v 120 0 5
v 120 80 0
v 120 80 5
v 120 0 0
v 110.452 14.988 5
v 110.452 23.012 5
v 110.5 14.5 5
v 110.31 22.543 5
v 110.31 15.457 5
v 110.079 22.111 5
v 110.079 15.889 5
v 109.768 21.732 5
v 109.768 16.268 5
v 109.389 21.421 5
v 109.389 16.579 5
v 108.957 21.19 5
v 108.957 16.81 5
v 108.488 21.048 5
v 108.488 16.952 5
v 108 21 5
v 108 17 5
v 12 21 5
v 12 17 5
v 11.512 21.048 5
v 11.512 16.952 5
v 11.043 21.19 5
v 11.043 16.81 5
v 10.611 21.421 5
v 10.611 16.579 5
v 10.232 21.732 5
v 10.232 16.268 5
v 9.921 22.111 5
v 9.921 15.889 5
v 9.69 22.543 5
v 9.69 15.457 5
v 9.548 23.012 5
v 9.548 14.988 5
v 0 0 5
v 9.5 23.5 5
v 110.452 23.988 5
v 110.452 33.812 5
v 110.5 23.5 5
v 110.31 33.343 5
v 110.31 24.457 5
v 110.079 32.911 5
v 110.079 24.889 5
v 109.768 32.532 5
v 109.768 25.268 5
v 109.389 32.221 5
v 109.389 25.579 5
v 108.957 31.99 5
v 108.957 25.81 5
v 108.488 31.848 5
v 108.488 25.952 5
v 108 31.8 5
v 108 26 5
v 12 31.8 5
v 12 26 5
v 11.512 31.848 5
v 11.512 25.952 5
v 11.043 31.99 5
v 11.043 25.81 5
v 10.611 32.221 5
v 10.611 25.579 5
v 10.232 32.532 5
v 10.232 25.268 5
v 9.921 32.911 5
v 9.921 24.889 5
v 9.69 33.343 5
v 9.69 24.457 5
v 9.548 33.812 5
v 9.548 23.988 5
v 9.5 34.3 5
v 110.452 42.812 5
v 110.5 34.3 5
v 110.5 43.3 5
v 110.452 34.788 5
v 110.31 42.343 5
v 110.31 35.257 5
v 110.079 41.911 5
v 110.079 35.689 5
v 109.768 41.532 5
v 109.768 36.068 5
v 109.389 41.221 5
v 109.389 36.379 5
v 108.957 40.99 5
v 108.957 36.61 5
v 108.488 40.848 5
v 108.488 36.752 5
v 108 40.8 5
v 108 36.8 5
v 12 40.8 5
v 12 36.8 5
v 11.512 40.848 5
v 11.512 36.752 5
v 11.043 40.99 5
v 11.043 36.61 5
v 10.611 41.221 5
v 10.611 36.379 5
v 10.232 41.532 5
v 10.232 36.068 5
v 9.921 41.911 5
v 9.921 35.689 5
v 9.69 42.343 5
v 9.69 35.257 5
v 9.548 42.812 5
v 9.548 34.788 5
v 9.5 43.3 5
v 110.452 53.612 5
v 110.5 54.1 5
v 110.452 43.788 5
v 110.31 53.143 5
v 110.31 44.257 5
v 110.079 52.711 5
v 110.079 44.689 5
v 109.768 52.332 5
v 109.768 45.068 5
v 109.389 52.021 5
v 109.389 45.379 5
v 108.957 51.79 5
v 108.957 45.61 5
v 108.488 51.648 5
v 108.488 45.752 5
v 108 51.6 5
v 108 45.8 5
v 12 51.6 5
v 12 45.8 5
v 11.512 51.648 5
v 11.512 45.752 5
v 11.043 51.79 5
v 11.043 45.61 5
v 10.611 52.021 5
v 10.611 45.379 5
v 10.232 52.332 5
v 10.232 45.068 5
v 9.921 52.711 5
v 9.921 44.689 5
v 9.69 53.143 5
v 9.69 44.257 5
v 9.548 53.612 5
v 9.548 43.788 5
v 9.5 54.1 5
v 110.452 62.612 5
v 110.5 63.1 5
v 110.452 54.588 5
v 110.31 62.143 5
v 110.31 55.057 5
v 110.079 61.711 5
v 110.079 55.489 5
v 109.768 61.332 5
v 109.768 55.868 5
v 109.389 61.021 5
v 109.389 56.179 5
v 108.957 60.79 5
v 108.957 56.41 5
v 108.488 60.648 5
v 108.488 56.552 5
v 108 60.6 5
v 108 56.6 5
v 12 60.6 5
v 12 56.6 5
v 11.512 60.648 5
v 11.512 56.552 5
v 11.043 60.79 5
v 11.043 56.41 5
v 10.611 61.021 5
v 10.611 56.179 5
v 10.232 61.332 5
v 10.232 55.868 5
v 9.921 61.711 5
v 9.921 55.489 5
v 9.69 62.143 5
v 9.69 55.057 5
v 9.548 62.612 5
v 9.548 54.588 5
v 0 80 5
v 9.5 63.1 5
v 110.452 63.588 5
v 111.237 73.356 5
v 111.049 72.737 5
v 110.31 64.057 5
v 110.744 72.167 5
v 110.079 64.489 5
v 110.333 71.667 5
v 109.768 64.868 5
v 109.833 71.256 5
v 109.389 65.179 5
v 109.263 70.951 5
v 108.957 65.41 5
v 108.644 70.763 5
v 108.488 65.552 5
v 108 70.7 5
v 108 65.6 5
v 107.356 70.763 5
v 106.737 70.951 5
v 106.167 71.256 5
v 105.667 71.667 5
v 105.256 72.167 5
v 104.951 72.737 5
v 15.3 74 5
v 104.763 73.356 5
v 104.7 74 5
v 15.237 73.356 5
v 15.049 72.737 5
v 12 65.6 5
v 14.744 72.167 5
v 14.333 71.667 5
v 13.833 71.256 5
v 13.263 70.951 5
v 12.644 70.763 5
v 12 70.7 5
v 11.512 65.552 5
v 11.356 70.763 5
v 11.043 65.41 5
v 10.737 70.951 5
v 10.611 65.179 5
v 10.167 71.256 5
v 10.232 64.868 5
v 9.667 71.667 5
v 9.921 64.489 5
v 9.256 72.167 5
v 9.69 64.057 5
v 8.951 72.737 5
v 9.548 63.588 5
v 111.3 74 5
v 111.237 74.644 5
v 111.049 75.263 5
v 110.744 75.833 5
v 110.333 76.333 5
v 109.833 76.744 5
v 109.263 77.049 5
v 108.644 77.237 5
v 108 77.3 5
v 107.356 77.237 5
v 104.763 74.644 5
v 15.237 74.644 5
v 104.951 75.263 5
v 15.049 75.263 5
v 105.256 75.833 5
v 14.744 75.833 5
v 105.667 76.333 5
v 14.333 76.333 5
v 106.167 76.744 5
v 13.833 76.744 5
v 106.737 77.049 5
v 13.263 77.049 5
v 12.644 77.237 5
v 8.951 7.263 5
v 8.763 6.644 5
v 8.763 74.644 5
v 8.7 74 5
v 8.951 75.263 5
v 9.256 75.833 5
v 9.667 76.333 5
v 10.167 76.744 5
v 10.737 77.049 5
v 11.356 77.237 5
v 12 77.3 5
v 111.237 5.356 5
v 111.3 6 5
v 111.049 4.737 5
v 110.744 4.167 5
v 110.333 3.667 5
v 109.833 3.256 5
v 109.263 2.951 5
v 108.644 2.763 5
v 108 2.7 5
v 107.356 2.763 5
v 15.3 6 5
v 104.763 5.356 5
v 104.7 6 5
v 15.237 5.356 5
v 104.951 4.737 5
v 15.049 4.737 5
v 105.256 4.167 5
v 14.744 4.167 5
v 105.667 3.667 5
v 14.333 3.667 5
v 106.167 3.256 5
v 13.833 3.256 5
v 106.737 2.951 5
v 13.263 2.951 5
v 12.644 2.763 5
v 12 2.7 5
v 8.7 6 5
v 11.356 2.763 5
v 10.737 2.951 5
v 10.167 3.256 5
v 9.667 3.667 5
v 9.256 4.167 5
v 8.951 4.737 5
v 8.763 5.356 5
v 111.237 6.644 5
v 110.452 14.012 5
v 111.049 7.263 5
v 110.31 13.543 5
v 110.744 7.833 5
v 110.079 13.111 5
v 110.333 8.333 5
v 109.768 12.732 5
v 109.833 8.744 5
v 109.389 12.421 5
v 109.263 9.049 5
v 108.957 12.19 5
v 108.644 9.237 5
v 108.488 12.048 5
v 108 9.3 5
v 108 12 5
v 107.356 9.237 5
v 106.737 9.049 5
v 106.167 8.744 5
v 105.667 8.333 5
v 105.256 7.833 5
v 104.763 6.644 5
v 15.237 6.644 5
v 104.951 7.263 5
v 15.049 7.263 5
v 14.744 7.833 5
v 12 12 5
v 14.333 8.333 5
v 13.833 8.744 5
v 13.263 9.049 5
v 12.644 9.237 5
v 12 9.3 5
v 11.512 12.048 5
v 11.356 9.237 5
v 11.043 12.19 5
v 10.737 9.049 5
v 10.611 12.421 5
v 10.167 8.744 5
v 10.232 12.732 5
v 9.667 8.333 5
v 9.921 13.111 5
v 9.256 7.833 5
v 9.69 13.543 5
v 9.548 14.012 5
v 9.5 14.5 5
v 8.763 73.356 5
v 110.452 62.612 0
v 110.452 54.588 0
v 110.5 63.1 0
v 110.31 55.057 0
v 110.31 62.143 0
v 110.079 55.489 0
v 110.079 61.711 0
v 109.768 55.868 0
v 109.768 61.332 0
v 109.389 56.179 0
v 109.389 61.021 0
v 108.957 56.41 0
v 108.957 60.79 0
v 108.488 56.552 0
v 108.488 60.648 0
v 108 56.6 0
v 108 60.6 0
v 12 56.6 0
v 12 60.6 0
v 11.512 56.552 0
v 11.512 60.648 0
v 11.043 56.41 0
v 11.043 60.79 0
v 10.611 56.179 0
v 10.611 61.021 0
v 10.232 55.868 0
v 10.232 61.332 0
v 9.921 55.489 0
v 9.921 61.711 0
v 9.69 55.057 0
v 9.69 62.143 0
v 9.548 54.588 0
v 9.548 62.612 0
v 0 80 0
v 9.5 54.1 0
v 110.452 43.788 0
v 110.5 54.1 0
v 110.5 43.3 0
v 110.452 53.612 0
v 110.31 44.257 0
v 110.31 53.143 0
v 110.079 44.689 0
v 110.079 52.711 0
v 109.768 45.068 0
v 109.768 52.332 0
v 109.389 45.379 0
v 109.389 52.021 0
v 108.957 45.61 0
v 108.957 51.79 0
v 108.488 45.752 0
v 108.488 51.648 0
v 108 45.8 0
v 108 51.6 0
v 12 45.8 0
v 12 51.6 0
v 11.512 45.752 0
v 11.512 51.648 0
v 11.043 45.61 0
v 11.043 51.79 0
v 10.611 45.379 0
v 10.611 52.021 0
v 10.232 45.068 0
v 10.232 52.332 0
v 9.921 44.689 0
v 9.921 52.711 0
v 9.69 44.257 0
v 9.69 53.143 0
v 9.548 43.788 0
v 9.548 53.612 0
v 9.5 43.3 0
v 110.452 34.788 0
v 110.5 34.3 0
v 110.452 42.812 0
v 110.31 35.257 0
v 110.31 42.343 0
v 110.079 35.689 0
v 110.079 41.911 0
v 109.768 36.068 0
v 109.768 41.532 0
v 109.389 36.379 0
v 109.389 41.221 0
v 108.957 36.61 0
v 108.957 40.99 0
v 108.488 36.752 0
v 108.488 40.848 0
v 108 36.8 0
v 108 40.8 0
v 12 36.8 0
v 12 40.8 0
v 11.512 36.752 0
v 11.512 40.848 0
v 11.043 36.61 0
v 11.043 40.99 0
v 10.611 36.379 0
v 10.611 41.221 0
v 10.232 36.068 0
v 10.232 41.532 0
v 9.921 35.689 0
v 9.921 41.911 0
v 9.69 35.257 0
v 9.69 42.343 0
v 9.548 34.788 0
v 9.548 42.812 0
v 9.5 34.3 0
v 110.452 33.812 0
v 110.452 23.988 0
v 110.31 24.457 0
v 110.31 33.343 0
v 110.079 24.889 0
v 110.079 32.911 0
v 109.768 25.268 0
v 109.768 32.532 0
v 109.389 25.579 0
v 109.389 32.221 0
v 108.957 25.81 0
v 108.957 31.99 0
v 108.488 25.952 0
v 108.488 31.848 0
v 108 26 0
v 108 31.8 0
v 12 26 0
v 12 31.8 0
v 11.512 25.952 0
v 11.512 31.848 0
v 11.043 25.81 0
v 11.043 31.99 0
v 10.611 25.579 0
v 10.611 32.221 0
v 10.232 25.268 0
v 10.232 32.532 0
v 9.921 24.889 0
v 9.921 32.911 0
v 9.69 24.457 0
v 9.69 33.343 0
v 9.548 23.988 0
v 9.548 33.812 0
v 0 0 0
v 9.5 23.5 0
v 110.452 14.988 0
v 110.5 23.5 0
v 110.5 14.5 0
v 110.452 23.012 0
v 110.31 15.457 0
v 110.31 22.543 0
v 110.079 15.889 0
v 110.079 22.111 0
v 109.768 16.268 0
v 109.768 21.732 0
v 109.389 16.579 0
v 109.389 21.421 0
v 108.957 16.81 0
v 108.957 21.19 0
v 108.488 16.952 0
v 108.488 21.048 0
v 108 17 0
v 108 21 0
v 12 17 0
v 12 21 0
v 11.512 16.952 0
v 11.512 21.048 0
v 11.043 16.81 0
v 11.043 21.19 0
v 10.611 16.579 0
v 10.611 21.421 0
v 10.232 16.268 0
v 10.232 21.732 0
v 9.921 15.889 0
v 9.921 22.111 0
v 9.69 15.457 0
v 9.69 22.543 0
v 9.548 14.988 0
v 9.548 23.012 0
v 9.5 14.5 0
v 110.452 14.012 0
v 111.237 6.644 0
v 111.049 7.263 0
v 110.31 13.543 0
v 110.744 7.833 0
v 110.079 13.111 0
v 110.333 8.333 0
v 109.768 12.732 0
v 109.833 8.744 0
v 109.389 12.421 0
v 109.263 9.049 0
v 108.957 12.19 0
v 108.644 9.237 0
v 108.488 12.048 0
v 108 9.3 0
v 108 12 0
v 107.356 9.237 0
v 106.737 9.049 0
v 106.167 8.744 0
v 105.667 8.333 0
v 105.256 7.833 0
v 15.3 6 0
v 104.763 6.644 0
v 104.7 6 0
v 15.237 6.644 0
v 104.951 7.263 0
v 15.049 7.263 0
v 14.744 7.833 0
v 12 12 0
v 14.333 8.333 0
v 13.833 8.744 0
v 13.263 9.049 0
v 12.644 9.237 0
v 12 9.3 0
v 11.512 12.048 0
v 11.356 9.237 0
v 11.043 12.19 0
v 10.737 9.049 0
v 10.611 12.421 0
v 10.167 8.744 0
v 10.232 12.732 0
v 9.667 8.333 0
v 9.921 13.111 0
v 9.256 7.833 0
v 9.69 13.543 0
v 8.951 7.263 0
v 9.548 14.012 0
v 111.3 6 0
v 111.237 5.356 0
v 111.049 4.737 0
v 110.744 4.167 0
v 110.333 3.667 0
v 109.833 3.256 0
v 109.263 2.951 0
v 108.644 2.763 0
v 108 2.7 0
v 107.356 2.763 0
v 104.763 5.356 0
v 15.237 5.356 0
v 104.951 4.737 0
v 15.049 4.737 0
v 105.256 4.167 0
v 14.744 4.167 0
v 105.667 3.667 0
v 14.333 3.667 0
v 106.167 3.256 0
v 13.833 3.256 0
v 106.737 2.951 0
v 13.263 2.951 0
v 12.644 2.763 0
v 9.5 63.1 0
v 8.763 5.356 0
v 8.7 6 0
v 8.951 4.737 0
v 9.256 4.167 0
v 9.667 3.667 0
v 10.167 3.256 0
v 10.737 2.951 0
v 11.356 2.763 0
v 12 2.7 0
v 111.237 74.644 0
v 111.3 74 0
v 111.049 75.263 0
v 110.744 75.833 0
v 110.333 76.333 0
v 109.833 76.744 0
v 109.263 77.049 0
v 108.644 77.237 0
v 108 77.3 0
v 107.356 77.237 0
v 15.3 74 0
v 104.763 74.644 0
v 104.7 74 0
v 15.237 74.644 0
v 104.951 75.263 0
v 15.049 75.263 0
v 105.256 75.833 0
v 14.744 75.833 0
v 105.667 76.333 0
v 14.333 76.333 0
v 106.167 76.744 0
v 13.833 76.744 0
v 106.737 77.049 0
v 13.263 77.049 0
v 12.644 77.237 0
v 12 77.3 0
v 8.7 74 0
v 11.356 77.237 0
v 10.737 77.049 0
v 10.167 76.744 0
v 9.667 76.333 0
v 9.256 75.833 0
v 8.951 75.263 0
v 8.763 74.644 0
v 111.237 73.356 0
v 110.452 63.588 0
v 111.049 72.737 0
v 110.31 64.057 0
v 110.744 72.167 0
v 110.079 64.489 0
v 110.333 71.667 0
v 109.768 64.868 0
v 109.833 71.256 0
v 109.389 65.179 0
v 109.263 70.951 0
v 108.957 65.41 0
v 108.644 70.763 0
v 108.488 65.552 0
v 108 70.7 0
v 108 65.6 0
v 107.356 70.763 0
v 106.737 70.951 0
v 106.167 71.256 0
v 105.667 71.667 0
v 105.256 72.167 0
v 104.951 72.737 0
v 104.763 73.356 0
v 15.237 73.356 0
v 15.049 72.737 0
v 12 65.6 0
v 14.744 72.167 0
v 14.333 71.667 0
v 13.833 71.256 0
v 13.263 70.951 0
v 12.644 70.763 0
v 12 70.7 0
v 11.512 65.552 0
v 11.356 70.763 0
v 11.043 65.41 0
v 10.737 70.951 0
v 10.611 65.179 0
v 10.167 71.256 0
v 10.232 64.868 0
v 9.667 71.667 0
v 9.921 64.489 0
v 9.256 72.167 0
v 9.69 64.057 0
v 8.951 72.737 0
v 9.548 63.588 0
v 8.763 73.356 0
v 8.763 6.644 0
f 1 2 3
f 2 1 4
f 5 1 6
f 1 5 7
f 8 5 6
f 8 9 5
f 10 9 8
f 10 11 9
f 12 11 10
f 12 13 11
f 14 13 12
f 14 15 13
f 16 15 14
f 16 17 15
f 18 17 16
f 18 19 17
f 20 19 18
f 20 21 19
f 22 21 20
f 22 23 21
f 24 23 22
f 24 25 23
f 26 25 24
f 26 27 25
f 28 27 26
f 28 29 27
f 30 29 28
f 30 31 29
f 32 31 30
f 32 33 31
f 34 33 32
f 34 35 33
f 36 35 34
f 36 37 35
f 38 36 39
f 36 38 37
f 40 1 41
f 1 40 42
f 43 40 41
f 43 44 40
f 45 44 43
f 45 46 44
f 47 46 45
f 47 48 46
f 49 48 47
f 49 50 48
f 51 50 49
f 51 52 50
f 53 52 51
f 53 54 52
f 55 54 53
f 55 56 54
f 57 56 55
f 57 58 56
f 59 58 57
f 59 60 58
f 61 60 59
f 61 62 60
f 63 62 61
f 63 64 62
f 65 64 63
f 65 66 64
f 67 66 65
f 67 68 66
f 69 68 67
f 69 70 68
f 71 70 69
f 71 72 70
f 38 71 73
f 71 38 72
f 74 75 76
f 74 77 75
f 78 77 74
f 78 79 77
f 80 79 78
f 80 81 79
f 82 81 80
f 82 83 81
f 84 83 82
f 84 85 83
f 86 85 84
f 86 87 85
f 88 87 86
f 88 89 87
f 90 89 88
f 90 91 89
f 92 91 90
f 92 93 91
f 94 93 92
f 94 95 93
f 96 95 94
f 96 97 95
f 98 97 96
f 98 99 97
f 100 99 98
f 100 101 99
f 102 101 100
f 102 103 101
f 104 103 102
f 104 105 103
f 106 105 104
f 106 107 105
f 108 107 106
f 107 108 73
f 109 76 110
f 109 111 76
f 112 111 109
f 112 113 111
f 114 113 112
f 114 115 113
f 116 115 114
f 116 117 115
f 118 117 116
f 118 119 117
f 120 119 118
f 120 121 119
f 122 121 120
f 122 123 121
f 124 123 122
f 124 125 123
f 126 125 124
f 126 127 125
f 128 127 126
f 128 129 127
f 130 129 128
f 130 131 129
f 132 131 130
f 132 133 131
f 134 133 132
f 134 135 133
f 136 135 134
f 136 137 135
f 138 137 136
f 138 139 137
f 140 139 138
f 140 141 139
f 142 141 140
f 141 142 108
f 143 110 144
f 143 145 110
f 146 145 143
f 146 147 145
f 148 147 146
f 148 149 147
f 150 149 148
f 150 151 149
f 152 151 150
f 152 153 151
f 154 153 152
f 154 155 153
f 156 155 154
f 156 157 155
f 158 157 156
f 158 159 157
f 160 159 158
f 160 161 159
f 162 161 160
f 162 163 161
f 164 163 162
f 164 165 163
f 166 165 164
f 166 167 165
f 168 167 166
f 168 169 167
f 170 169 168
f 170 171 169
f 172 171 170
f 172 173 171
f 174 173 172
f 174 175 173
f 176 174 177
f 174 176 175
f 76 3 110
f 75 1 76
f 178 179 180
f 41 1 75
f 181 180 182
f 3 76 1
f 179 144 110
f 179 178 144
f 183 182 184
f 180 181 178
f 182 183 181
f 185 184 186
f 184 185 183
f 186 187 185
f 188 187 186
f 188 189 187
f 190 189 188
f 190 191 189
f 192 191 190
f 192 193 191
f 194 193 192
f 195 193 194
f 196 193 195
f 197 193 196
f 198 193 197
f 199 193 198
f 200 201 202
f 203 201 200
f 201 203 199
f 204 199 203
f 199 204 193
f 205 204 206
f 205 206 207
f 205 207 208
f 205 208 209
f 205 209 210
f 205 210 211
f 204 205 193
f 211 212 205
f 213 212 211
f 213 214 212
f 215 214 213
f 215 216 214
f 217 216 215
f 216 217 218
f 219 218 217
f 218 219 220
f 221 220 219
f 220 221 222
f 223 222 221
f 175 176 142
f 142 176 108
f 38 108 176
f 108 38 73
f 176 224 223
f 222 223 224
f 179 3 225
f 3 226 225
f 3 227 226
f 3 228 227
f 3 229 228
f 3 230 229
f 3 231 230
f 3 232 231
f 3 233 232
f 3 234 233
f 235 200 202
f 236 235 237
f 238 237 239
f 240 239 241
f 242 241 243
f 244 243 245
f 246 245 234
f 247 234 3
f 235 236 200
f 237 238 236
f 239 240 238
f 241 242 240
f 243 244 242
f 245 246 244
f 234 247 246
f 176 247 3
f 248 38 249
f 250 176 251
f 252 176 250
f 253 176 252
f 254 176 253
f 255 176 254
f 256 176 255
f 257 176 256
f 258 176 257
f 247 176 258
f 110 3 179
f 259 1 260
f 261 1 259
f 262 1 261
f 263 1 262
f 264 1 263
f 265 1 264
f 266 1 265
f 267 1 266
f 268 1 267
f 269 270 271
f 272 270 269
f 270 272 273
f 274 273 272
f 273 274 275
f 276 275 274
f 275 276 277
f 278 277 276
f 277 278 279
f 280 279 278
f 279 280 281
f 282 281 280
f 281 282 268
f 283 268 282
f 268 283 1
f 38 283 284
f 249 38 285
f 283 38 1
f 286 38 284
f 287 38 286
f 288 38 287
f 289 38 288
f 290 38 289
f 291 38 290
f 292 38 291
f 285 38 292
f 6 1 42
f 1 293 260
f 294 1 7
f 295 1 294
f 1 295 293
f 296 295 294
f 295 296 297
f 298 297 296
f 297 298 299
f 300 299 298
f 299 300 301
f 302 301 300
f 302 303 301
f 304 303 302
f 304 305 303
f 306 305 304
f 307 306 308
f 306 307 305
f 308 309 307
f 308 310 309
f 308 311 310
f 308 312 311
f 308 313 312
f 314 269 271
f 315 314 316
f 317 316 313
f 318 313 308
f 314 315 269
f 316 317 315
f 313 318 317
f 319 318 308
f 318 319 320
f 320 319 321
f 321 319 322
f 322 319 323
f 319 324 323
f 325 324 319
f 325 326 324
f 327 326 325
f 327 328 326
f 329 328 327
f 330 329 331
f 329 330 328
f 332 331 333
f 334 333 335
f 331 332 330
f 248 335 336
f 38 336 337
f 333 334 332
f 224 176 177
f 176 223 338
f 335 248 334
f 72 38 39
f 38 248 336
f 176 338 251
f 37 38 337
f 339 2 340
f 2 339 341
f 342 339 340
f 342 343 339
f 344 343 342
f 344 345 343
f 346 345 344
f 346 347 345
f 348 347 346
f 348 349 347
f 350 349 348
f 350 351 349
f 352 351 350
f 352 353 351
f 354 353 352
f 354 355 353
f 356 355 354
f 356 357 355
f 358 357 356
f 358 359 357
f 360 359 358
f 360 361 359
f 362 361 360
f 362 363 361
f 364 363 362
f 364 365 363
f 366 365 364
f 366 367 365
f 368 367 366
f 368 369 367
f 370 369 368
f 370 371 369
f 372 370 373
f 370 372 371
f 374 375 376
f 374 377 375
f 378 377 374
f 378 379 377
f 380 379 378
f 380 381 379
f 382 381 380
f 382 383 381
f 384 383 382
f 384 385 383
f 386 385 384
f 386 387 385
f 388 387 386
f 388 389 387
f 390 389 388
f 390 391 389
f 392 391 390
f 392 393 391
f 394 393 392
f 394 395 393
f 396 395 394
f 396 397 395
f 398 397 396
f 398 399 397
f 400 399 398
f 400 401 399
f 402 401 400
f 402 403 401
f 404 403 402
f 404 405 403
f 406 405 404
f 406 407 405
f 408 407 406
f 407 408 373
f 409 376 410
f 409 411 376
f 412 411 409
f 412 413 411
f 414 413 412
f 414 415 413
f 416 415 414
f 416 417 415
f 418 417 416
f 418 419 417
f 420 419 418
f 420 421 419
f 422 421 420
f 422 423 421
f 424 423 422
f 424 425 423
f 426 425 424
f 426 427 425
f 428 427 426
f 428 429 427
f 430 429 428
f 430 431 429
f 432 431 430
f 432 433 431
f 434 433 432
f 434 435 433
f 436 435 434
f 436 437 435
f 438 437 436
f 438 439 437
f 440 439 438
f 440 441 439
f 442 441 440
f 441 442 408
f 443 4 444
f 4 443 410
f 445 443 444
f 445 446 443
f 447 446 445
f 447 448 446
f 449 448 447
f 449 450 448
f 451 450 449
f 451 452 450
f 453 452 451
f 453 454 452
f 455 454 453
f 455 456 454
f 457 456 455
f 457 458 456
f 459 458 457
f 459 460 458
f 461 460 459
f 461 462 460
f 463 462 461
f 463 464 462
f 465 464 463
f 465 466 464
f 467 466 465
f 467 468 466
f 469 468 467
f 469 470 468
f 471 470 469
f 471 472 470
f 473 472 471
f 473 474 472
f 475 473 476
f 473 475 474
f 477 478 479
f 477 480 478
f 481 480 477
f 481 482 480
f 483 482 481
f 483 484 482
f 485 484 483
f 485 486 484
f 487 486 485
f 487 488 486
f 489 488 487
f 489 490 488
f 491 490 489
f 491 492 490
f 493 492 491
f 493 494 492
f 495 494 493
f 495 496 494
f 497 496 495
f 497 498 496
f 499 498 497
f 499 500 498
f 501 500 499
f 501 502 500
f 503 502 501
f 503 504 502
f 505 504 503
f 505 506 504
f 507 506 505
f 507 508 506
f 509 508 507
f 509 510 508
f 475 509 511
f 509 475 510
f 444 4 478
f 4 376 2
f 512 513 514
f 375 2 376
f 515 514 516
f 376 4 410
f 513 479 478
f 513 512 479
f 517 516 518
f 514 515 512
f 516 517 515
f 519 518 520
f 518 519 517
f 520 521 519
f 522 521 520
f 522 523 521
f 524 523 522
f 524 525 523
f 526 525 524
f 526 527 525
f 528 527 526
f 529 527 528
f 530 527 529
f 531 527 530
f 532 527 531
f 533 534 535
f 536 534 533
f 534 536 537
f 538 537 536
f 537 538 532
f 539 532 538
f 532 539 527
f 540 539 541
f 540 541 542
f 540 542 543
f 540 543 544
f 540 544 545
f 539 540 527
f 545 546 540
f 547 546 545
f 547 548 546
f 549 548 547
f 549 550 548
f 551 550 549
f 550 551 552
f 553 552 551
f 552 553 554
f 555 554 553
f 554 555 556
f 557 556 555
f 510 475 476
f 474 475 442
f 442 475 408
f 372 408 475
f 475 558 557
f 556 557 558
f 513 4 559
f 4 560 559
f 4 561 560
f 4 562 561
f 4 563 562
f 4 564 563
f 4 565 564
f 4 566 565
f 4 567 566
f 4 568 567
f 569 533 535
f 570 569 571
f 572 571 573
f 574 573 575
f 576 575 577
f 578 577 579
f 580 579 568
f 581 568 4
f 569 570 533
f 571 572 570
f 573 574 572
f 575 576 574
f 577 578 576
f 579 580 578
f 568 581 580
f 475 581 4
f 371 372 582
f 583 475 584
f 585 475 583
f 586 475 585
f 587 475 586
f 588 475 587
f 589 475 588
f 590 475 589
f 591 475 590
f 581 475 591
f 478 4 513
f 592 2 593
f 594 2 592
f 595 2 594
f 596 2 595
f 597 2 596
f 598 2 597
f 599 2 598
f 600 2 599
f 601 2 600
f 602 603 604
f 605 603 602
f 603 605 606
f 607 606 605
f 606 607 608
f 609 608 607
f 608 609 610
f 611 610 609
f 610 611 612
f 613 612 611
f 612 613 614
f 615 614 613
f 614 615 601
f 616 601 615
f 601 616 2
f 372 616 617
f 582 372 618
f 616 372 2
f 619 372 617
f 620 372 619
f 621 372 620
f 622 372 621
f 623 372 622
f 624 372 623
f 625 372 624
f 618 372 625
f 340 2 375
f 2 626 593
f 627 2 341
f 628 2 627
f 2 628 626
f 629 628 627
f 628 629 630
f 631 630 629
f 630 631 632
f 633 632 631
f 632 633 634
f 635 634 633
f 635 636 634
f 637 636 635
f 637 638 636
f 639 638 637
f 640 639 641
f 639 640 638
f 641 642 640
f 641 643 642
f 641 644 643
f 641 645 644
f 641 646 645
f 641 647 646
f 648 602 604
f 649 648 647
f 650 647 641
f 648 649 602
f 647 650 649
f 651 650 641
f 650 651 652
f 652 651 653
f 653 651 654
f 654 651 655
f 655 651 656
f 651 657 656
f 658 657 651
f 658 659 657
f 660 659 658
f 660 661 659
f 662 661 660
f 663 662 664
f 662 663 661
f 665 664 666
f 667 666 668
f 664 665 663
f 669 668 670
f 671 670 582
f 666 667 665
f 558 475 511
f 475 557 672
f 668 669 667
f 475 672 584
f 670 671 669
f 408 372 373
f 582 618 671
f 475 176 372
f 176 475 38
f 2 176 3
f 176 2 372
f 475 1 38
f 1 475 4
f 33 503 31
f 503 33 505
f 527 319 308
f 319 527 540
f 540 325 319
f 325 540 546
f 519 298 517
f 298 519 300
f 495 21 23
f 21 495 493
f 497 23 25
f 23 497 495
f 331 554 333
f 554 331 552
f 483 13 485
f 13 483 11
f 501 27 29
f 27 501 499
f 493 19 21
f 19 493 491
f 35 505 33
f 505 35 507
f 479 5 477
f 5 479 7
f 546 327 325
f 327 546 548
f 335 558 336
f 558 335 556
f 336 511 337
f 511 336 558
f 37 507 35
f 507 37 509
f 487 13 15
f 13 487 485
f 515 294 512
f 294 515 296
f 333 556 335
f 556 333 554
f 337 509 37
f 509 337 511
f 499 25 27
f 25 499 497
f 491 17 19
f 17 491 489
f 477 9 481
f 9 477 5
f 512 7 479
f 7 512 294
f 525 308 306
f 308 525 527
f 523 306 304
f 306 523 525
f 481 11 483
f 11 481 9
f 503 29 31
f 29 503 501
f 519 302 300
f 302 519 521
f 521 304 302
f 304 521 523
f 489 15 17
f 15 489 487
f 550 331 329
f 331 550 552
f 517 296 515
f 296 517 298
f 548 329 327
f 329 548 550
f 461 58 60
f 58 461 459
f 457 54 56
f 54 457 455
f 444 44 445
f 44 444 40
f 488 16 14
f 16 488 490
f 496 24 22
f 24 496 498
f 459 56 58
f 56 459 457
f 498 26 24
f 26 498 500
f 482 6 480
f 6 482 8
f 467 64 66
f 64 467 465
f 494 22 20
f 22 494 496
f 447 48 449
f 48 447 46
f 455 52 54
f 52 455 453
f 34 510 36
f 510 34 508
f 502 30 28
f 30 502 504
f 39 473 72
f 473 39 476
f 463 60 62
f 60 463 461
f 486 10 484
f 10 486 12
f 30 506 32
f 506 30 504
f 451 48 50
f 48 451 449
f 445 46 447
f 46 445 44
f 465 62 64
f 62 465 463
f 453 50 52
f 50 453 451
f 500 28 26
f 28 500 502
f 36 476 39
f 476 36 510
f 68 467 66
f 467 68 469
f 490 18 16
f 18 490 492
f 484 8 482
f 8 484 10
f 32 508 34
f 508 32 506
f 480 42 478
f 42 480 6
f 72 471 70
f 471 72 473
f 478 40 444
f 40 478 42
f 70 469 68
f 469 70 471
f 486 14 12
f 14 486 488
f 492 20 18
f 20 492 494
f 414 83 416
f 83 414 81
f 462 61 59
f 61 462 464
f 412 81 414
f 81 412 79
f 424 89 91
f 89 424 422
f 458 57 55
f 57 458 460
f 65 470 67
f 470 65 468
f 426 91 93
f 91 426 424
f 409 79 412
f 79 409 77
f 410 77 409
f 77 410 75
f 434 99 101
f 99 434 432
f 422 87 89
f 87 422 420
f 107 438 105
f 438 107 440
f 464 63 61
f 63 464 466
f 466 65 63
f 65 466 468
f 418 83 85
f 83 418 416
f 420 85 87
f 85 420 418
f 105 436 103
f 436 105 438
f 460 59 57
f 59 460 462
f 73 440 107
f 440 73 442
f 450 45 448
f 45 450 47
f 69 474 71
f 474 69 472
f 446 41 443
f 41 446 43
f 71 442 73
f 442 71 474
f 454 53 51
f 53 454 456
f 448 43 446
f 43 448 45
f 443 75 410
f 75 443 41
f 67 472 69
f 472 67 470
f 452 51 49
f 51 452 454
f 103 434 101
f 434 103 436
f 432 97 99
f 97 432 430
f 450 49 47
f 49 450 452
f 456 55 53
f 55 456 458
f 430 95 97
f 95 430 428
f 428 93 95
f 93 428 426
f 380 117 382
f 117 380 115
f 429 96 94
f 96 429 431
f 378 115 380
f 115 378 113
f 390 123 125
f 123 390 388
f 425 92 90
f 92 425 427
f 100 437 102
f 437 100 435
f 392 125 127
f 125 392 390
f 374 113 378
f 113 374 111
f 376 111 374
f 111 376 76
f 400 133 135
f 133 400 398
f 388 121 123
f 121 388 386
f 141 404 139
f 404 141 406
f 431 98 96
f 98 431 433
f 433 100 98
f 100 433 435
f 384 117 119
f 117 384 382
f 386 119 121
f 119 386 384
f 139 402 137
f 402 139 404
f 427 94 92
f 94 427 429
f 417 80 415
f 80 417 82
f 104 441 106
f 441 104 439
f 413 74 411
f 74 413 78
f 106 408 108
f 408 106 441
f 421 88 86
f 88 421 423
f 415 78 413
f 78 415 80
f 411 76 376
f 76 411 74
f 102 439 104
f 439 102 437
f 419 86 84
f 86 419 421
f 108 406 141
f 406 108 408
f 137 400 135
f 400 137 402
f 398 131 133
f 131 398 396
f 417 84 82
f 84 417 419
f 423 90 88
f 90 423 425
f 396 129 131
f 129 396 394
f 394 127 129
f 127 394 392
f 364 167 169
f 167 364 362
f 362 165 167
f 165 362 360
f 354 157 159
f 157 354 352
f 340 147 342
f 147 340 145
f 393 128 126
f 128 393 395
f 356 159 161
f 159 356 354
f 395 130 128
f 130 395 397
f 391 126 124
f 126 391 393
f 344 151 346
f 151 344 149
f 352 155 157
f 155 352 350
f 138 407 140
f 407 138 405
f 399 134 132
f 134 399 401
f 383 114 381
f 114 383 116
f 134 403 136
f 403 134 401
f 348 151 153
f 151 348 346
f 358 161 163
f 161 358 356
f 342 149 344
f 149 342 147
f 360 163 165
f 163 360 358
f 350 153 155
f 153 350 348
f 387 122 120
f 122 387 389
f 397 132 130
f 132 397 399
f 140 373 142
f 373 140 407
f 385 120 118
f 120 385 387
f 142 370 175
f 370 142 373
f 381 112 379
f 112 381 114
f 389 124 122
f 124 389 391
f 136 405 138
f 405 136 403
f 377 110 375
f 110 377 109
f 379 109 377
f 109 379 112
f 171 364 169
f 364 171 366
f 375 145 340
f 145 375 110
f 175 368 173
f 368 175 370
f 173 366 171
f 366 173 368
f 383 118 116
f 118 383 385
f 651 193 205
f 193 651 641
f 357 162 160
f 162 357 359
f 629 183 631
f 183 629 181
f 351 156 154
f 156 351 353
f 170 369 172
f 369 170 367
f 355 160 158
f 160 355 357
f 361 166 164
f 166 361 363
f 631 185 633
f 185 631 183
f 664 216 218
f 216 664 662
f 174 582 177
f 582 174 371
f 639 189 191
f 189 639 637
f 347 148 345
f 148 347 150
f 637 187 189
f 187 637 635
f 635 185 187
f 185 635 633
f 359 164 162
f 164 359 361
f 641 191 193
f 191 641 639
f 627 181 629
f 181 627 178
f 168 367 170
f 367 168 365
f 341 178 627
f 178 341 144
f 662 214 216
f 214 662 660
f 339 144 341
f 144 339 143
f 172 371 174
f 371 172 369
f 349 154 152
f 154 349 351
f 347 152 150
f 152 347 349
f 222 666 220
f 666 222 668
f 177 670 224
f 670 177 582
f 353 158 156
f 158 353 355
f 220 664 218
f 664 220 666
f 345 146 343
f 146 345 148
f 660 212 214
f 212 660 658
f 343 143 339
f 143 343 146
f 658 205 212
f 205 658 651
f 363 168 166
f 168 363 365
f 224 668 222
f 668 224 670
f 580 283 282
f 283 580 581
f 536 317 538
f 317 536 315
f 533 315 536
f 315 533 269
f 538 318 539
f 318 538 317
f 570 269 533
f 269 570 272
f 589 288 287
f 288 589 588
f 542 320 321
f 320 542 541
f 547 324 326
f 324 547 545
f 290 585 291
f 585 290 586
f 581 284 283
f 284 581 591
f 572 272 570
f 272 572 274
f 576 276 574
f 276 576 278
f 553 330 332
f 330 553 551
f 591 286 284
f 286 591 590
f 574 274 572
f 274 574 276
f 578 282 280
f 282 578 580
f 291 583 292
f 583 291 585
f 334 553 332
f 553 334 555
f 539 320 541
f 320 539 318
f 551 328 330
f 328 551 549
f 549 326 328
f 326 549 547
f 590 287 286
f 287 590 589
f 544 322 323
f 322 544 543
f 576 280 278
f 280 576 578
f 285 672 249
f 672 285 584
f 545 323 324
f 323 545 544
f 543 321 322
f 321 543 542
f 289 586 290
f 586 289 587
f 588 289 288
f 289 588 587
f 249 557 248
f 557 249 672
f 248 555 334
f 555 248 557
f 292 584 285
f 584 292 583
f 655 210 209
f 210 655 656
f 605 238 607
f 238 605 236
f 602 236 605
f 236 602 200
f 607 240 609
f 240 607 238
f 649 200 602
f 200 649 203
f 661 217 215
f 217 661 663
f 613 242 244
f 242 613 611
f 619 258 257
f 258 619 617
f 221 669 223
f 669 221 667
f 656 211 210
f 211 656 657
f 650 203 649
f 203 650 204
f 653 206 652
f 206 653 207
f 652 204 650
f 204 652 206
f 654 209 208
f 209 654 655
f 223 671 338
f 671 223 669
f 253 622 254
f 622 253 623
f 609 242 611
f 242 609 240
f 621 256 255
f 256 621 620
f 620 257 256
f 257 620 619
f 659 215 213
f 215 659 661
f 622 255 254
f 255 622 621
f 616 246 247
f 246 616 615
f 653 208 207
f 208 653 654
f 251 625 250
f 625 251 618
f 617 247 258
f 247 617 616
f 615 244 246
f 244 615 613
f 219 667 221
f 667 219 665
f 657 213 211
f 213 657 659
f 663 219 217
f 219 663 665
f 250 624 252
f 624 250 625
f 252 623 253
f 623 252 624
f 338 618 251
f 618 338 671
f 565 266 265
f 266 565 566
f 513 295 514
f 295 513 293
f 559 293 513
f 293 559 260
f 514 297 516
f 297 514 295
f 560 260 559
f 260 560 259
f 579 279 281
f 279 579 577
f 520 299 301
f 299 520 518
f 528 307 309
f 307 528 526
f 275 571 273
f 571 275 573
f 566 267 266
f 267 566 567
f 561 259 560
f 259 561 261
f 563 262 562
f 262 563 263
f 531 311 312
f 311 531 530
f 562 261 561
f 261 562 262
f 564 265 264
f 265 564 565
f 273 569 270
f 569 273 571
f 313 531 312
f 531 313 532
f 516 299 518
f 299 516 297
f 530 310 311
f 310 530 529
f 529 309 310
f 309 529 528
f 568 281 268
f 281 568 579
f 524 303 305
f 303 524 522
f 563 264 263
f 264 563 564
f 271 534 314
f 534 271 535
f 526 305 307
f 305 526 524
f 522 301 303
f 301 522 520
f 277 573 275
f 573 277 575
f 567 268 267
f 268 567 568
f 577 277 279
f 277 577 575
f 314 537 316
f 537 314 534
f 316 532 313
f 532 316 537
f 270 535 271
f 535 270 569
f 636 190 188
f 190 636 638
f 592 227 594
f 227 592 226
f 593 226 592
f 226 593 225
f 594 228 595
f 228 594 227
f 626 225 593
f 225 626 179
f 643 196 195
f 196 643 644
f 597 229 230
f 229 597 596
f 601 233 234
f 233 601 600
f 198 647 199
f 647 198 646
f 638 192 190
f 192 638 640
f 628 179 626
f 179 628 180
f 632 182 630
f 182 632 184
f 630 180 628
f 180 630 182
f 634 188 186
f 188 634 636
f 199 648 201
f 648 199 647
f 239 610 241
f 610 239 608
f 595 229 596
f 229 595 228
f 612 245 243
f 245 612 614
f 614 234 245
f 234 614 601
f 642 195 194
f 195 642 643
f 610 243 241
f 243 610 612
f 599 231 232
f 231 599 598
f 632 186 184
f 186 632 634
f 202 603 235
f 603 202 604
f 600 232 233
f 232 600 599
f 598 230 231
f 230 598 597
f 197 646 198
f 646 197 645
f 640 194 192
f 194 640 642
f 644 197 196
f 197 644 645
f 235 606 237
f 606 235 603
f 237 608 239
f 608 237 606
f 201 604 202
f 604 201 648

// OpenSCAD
$fn = 32;

// ----------------------------------------------------------------------
// Slotted panel: 120 x 80 mm, 6 рядов of slots
// ----------------------------------------------------------------------

// --- parameters (mm) ---
panel_w = 120;            // panel width
panel_d = 80;             // panel depth
thick = 5;                // panel thickness
slot_w = 5;               // slot width
pitch0 = 9;               // first row pitch
pitch_step = 1.8;         // pitch increase per row
margin = 12;              // margin around the slot field
rows = 6;                 // number of slot rows
mount_d = 6.6;            // mounting holes
mount_x = 48;             // mounting hole offset

difference() {
  union() {
    cube([panel_w, panel_d, thick]);
  }
  /* slot rows: stadium shaped cutters, 2.5 mm clear of both faces */
  /* row 0: pitch 9, length 96 */
  hull() {
    translate([12, 14.5, -2.5]) cylinder(h = thick + 5, d = slot_w);
    translate([108, 14.5, -2.5]) cylinder(h = thick + 5, d = slot_w);
  }
  /* row 1: pitch 10.8, length 96 */
  hull() {
    translate([12, 23.5, -2.5]) cylinder(h = thick + 5, d = slot_w);
    translate([108, 23.5, -2.5]) cylinder(h = thick + 5, d = slot_w);
  }
  /* row 2: pitch 9, length 96 */
  hull() {
    translate([12, 34.3, -2.5]) cylinder(h = thick + 5, d = slot_w);
    translate([108, 34.3, -2.5]) cylinder(h = thick + 5, d = slot_w);
  }
  /* row 3: pitch 10.8, length 96 */
  hull() {
    translate([12, 43.3, -2.5]) cylinder(h = thick + 5, d = slot_w);
    translate([108, 43.3, -2.5]) cylinder(h = thick + 5, d = slot_w);
  }
  /* row 4: pitch 9, length 96 */
  hull() {
    translate([12, 54.1, -2.5]) cylinder(h = thick + 5, d = slot_w);
    translate([108, 54.1, -2.5]) cylinder(h = thick + 5, d = slot_w);
  }
  /* row 5: pitch 10.8, length 96 */
  hull() {
    translate([12, 63.1, -2.5]) cylinder(h = thick + 5, d = slot_w);
    translate([108, 63.1, -2.5]) cylinder(h = thick + 5, d = slot_w);
  }
  translate([12, 6, -2.5]) cylinder(h = 10, d = mount_d);
  translate([12, 74, -2.5]) cylinder(h = 10, d = mount_d);
  translate([108, 6, -2.5]) cylinder(h = 10, d = mount_d);
  translate([108, 74, -2.5]) cylinder(h = 10, d = mount_d);
}
